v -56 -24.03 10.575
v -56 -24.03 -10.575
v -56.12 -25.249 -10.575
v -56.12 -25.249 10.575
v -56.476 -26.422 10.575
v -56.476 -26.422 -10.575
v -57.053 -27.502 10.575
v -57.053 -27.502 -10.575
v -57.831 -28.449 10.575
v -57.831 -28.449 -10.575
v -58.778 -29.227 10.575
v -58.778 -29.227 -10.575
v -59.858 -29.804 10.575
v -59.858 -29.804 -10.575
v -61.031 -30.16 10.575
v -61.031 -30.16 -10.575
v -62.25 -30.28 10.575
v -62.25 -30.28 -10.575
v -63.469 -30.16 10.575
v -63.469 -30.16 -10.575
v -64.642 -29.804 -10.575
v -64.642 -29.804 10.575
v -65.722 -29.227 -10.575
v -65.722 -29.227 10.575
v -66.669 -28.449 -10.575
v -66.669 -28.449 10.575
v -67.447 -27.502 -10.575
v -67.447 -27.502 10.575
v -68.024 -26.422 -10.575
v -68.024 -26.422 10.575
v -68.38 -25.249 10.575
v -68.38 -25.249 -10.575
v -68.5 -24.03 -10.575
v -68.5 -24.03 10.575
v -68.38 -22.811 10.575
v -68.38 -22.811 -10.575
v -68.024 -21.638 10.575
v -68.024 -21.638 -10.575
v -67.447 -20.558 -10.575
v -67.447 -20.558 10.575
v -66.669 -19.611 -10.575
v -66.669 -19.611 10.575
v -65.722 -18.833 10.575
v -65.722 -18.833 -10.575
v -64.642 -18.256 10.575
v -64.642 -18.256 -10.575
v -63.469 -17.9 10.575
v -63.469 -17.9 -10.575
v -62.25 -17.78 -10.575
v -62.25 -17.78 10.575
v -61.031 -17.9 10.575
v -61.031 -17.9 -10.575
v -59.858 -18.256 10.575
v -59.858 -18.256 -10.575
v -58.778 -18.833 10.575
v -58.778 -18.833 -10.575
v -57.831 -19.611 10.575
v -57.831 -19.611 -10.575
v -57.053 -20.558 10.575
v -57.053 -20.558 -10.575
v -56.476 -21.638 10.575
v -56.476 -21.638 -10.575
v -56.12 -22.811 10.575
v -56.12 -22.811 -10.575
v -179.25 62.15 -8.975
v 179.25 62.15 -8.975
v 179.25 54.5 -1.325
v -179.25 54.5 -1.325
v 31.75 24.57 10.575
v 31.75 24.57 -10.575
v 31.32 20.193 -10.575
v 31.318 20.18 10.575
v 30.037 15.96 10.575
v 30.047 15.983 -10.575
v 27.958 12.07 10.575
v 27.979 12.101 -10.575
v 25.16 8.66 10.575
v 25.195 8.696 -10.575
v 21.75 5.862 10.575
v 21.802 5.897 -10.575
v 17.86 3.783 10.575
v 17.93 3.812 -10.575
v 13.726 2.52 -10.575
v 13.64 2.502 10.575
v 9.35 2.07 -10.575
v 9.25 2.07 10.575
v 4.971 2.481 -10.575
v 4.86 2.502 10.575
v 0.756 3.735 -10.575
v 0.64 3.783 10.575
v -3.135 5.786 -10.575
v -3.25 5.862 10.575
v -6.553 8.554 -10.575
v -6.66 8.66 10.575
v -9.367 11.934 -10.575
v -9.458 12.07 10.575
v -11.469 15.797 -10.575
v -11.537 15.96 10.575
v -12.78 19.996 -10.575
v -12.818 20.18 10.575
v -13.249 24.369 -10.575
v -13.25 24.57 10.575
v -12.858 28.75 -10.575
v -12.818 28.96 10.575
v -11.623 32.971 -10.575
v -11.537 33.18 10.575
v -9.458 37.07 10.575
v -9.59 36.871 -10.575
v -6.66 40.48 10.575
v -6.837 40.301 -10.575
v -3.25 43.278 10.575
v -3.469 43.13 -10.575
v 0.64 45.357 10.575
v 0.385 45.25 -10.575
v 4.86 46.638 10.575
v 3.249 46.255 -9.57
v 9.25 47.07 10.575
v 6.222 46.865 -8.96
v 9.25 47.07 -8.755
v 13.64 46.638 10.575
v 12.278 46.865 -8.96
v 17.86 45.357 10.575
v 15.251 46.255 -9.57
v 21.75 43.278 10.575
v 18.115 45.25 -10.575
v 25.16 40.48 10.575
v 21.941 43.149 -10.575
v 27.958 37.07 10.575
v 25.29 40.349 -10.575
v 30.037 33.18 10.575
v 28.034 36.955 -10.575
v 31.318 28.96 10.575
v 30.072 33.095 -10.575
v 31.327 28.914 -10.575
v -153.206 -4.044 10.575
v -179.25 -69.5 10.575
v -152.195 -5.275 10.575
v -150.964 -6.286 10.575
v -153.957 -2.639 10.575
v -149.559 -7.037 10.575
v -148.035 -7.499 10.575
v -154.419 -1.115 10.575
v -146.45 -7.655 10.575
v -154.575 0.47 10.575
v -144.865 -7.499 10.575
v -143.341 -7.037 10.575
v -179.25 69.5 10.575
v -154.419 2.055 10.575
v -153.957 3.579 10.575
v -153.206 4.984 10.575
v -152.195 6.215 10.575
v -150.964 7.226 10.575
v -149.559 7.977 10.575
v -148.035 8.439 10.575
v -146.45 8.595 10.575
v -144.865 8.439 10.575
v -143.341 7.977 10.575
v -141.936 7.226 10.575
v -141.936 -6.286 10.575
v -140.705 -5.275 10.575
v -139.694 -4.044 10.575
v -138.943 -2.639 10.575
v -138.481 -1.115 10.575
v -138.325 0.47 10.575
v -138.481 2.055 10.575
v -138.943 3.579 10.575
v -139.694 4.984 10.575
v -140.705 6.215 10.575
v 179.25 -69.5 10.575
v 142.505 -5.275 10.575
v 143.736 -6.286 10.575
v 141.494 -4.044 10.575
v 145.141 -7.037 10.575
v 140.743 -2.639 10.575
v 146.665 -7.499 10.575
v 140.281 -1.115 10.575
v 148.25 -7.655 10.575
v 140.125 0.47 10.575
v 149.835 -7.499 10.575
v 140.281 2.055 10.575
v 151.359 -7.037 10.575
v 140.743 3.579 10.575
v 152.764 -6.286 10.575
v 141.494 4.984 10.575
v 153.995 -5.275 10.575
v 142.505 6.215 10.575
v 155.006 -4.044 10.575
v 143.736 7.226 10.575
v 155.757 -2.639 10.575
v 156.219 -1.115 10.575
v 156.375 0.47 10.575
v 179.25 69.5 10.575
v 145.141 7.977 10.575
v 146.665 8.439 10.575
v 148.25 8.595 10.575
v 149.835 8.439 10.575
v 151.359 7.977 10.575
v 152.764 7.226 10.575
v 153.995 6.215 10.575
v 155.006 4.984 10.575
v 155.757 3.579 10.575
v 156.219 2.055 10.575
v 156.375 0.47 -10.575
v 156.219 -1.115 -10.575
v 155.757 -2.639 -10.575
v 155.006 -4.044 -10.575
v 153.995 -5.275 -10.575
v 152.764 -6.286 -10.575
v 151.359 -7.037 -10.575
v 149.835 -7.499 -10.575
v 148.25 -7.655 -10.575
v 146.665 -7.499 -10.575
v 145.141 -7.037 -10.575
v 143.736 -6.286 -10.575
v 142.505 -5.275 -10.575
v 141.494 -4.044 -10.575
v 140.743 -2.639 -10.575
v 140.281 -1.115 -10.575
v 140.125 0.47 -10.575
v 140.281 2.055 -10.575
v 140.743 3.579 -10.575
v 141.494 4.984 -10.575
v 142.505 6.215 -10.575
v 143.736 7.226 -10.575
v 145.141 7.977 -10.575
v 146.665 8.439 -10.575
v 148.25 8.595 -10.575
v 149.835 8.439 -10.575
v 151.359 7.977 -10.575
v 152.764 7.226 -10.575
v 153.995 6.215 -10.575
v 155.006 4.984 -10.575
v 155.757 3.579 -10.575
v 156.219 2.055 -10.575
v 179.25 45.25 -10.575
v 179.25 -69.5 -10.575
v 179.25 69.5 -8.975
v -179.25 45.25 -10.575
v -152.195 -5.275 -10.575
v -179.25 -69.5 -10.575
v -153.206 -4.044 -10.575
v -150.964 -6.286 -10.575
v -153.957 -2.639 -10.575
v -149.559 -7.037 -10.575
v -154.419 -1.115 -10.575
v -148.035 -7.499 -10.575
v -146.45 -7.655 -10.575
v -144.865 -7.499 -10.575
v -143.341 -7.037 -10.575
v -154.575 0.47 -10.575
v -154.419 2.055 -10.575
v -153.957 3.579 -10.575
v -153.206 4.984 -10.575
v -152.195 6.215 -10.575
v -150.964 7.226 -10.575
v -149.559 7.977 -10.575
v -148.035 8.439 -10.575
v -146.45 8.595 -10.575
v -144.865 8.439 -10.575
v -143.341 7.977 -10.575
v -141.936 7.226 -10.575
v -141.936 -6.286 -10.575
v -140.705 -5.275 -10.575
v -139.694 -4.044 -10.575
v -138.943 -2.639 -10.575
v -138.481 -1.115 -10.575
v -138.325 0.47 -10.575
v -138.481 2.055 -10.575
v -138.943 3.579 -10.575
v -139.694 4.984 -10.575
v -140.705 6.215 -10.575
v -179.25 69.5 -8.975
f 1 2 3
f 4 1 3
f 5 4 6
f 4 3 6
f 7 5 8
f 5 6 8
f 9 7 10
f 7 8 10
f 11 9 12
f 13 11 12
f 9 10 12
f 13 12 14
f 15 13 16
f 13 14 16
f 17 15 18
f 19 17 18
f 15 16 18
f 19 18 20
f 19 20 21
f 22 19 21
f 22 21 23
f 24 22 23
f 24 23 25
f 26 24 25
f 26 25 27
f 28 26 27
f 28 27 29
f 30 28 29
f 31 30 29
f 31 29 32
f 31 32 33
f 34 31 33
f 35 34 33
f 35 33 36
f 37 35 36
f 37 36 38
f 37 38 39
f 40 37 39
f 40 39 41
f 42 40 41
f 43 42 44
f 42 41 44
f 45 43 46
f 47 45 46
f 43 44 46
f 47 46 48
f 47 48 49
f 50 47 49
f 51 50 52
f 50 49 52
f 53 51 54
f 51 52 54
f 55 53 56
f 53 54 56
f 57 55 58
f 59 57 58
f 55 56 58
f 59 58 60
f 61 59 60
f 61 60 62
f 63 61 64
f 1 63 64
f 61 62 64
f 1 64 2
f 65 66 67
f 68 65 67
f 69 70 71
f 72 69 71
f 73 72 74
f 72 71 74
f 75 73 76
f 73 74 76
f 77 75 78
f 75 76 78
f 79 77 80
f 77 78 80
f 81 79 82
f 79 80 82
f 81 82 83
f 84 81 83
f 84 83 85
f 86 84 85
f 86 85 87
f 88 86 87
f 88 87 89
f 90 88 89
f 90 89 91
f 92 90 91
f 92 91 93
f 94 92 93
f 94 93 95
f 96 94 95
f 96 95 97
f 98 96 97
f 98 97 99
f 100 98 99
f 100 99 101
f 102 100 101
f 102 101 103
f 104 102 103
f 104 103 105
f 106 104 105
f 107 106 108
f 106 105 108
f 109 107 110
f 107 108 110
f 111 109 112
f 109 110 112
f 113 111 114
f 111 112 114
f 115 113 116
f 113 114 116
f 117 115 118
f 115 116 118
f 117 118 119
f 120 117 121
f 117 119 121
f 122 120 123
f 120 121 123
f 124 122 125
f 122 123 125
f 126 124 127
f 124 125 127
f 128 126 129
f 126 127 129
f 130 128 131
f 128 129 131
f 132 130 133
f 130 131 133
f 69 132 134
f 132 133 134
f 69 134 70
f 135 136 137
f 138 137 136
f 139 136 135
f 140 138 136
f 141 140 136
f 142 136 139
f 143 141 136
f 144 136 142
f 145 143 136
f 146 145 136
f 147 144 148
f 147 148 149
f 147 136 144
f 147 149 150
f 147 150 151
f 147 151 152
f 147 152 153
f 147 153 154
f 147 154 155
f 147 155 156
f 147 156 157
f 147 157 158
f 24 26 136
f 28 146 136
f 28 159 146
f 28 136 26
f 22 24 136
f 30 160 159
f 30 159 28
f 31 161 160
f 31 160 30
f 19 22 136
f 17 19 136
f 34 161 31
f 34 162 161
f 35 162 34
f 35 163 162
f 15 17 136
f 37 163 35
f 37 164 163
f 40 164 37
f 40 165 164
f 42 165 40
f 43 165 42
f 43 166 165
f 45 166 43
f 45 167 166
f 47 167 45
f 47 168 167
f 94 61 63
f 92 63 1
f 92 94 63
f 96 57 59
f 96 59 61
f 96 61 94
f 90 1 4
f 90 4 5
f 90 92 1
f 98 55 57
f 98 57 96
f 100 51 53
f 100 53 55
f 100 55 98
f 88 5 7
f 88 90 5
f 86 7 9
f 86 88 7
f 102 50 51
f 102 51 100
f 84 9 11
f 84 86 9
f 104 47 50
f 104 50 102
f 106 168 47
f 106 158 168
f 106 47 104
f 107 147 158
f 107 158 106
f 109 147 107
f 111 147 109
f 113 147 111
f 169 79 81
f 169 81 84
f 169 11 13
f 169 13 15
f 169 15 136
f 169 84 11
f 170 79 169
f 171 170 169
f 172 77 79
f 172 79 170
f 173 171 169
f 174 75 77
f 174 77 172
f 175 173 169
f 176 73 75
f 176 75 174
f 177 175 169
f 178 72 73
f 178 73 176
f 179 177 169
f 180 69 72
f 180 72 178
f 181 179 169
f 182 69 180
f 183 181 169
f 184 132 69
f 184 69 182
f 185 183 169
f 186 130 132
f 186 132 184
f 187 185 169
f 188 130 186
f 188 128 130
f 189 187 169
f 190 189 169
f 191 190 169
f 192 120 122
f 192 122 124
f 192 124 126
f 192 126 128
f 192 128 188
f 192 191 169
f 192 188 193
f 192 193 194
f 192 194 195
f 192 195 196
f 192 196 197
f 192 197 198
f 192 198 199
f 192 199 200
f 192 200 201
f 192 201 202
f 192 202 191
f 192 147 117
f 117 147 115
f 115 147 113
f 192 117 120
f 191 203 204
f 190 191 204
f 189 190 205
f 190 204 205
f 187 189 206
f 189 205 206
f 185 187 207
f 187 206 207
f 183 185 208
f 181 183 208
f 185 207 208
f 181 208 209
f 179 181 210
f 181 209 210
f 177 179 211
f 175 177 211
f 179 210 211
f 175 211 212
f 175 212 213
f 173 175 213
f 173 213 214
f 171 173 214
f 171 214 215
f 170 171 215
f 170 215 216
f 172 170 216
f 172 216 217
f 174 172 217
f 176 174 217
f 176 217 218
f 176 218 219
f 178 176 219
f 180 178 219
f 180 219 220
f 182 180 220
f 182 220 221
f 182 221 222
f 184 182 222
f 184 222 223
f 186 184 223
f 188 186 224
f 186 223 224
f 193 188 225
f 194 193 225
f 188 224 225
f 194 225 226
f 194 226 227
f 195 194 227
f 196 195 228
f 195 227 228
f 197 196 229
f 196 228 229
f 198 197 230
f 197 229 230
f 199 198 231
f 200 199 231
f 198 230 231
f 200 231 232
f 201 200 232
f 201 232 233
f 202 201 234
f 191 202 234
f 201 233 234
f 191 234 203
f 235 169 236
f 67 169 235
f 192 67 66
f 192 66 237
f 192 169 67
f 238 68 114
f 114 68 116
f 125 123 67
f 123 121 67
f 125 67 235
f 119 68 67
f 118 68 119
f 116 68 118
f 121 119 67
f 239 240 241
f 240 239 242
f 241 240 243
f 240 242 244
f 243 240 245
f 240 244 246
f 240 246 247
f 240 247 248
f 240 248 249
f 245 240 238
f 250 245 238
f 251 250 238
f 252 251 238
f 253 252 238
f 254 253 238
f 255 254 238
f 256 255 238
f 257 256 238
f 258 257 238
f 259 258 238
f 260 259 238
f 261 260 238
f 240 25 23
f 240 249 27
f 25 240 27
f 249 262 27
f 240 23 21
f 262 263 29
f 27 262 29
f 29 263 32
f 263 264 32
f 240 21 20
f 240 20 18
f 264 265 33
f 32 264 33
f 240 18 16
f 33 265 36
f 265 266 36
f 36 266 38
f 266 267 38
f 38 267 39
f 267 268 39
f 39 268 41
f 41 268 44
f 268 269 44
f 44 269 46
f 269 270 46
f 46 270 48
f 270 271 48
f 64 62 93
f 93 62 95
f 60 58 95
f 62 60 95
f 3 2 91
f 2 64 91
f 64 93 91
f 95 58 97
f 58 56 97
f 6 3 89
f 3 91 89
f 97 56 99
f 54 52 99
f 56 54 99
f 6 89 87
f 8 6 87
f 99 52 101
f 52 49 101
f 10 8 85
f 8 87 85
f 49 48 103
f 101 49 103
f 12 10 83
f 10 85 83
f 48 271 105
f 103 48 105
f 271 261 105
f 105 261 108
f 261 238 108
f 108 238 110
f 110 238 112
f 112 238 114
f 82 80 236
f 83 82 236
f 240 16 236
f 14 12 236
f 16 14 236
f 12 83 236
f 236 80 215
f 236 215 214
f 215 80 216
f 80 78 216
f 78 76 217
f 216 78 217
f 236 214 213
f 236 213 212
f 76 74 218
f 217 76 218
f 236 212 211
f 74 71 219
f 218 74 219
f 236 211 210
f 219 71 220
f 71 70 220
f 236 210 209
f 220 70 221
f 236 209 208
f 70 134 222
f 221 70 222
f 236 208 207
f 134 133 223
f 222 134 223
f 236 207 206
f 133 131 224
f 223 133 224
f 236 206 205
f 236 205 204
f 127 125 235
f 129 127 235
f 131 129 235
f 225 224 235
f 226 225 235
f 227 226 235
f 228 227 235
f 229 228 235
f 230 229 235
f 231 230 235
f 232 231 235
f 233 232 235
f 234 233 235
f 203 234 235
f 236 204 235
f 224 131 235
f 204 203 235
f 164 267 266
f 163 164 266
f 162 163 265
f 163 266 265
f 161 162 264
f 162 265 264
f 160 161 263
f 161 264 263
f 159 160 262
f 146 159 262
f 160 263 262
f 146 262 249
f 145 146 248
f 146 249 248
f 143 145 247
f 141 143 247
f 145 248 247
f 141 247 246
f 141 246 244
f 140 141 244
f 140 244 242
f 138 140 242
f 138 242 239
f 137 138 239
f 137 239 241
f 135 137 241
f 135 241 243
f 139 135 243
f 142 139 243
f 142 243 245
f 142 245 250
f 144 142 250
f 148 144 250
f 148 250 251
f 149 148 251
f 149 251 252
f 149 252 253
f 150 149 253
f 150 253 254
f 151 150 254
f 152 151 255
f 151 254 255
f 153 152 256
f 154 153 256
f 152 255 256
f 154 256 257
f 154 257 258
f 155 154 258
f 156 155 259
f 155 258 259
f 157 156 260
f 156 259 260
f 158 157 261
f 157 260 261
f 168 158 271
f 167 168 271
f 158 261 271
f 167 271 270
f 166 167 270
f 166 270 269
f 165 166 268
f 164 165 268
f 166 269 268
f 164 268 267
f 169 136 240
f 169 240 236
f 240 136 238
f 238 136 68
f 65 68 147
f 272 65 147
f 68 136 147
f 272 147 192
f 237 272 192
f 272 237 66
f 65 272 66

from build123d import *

# Parameters (mm, degrees)
F0_W     = 358.5
F0_H     = 139
F1_DEPTH = 10.575
F3_DEPTH = 358.501
F4_R     = 8.125
F4_R_2   = 6.25
F4_R_3   = 22.5
F5_DEPTH = 21.151


with BuildPart() as f1:
    # F0 (on Top) → F1 (new body, symmetric)
    with BuildSketch(Plane.XY):
        Rectangle(F0_W, F0_H)
    extrude(amount=F1_DEPTH, both=True)

    # F2 (on face) → F3 (cut, through all)
    with BuildSketch(Plane.YZ.offset(179.25)):
        Polygon((69.5, -8.975), (62.15, -8.975), (54.5, -1.325), (45.25, -10.575), (69.5, -10.575), align=None)
    extrude(amount=-F3_DEPTH, mode=Mode.SUBTRACT)

    # F4 (on face) → F5 (cut, through all)
    with BuildSketch(Plane(origin=(0, 0, -10.575), x_dir=(1, 0, 0), z_dir=(0, 0, -1))):
        with Locations((148.25, -0.47)):
            Circle(F4_R)
        with Locations((-146.45, -0.47)):
            Circle(F4_R)
        with Locations((-62.25, 24.03)):
            Circle(F4_R_2)
        with Locations((9.25, -24.57)):
            Circle(F4_R_3)
    extrude(amount=-F5_DEPTH, mode=Mode.SUBTRACT)


solid = f1.part
